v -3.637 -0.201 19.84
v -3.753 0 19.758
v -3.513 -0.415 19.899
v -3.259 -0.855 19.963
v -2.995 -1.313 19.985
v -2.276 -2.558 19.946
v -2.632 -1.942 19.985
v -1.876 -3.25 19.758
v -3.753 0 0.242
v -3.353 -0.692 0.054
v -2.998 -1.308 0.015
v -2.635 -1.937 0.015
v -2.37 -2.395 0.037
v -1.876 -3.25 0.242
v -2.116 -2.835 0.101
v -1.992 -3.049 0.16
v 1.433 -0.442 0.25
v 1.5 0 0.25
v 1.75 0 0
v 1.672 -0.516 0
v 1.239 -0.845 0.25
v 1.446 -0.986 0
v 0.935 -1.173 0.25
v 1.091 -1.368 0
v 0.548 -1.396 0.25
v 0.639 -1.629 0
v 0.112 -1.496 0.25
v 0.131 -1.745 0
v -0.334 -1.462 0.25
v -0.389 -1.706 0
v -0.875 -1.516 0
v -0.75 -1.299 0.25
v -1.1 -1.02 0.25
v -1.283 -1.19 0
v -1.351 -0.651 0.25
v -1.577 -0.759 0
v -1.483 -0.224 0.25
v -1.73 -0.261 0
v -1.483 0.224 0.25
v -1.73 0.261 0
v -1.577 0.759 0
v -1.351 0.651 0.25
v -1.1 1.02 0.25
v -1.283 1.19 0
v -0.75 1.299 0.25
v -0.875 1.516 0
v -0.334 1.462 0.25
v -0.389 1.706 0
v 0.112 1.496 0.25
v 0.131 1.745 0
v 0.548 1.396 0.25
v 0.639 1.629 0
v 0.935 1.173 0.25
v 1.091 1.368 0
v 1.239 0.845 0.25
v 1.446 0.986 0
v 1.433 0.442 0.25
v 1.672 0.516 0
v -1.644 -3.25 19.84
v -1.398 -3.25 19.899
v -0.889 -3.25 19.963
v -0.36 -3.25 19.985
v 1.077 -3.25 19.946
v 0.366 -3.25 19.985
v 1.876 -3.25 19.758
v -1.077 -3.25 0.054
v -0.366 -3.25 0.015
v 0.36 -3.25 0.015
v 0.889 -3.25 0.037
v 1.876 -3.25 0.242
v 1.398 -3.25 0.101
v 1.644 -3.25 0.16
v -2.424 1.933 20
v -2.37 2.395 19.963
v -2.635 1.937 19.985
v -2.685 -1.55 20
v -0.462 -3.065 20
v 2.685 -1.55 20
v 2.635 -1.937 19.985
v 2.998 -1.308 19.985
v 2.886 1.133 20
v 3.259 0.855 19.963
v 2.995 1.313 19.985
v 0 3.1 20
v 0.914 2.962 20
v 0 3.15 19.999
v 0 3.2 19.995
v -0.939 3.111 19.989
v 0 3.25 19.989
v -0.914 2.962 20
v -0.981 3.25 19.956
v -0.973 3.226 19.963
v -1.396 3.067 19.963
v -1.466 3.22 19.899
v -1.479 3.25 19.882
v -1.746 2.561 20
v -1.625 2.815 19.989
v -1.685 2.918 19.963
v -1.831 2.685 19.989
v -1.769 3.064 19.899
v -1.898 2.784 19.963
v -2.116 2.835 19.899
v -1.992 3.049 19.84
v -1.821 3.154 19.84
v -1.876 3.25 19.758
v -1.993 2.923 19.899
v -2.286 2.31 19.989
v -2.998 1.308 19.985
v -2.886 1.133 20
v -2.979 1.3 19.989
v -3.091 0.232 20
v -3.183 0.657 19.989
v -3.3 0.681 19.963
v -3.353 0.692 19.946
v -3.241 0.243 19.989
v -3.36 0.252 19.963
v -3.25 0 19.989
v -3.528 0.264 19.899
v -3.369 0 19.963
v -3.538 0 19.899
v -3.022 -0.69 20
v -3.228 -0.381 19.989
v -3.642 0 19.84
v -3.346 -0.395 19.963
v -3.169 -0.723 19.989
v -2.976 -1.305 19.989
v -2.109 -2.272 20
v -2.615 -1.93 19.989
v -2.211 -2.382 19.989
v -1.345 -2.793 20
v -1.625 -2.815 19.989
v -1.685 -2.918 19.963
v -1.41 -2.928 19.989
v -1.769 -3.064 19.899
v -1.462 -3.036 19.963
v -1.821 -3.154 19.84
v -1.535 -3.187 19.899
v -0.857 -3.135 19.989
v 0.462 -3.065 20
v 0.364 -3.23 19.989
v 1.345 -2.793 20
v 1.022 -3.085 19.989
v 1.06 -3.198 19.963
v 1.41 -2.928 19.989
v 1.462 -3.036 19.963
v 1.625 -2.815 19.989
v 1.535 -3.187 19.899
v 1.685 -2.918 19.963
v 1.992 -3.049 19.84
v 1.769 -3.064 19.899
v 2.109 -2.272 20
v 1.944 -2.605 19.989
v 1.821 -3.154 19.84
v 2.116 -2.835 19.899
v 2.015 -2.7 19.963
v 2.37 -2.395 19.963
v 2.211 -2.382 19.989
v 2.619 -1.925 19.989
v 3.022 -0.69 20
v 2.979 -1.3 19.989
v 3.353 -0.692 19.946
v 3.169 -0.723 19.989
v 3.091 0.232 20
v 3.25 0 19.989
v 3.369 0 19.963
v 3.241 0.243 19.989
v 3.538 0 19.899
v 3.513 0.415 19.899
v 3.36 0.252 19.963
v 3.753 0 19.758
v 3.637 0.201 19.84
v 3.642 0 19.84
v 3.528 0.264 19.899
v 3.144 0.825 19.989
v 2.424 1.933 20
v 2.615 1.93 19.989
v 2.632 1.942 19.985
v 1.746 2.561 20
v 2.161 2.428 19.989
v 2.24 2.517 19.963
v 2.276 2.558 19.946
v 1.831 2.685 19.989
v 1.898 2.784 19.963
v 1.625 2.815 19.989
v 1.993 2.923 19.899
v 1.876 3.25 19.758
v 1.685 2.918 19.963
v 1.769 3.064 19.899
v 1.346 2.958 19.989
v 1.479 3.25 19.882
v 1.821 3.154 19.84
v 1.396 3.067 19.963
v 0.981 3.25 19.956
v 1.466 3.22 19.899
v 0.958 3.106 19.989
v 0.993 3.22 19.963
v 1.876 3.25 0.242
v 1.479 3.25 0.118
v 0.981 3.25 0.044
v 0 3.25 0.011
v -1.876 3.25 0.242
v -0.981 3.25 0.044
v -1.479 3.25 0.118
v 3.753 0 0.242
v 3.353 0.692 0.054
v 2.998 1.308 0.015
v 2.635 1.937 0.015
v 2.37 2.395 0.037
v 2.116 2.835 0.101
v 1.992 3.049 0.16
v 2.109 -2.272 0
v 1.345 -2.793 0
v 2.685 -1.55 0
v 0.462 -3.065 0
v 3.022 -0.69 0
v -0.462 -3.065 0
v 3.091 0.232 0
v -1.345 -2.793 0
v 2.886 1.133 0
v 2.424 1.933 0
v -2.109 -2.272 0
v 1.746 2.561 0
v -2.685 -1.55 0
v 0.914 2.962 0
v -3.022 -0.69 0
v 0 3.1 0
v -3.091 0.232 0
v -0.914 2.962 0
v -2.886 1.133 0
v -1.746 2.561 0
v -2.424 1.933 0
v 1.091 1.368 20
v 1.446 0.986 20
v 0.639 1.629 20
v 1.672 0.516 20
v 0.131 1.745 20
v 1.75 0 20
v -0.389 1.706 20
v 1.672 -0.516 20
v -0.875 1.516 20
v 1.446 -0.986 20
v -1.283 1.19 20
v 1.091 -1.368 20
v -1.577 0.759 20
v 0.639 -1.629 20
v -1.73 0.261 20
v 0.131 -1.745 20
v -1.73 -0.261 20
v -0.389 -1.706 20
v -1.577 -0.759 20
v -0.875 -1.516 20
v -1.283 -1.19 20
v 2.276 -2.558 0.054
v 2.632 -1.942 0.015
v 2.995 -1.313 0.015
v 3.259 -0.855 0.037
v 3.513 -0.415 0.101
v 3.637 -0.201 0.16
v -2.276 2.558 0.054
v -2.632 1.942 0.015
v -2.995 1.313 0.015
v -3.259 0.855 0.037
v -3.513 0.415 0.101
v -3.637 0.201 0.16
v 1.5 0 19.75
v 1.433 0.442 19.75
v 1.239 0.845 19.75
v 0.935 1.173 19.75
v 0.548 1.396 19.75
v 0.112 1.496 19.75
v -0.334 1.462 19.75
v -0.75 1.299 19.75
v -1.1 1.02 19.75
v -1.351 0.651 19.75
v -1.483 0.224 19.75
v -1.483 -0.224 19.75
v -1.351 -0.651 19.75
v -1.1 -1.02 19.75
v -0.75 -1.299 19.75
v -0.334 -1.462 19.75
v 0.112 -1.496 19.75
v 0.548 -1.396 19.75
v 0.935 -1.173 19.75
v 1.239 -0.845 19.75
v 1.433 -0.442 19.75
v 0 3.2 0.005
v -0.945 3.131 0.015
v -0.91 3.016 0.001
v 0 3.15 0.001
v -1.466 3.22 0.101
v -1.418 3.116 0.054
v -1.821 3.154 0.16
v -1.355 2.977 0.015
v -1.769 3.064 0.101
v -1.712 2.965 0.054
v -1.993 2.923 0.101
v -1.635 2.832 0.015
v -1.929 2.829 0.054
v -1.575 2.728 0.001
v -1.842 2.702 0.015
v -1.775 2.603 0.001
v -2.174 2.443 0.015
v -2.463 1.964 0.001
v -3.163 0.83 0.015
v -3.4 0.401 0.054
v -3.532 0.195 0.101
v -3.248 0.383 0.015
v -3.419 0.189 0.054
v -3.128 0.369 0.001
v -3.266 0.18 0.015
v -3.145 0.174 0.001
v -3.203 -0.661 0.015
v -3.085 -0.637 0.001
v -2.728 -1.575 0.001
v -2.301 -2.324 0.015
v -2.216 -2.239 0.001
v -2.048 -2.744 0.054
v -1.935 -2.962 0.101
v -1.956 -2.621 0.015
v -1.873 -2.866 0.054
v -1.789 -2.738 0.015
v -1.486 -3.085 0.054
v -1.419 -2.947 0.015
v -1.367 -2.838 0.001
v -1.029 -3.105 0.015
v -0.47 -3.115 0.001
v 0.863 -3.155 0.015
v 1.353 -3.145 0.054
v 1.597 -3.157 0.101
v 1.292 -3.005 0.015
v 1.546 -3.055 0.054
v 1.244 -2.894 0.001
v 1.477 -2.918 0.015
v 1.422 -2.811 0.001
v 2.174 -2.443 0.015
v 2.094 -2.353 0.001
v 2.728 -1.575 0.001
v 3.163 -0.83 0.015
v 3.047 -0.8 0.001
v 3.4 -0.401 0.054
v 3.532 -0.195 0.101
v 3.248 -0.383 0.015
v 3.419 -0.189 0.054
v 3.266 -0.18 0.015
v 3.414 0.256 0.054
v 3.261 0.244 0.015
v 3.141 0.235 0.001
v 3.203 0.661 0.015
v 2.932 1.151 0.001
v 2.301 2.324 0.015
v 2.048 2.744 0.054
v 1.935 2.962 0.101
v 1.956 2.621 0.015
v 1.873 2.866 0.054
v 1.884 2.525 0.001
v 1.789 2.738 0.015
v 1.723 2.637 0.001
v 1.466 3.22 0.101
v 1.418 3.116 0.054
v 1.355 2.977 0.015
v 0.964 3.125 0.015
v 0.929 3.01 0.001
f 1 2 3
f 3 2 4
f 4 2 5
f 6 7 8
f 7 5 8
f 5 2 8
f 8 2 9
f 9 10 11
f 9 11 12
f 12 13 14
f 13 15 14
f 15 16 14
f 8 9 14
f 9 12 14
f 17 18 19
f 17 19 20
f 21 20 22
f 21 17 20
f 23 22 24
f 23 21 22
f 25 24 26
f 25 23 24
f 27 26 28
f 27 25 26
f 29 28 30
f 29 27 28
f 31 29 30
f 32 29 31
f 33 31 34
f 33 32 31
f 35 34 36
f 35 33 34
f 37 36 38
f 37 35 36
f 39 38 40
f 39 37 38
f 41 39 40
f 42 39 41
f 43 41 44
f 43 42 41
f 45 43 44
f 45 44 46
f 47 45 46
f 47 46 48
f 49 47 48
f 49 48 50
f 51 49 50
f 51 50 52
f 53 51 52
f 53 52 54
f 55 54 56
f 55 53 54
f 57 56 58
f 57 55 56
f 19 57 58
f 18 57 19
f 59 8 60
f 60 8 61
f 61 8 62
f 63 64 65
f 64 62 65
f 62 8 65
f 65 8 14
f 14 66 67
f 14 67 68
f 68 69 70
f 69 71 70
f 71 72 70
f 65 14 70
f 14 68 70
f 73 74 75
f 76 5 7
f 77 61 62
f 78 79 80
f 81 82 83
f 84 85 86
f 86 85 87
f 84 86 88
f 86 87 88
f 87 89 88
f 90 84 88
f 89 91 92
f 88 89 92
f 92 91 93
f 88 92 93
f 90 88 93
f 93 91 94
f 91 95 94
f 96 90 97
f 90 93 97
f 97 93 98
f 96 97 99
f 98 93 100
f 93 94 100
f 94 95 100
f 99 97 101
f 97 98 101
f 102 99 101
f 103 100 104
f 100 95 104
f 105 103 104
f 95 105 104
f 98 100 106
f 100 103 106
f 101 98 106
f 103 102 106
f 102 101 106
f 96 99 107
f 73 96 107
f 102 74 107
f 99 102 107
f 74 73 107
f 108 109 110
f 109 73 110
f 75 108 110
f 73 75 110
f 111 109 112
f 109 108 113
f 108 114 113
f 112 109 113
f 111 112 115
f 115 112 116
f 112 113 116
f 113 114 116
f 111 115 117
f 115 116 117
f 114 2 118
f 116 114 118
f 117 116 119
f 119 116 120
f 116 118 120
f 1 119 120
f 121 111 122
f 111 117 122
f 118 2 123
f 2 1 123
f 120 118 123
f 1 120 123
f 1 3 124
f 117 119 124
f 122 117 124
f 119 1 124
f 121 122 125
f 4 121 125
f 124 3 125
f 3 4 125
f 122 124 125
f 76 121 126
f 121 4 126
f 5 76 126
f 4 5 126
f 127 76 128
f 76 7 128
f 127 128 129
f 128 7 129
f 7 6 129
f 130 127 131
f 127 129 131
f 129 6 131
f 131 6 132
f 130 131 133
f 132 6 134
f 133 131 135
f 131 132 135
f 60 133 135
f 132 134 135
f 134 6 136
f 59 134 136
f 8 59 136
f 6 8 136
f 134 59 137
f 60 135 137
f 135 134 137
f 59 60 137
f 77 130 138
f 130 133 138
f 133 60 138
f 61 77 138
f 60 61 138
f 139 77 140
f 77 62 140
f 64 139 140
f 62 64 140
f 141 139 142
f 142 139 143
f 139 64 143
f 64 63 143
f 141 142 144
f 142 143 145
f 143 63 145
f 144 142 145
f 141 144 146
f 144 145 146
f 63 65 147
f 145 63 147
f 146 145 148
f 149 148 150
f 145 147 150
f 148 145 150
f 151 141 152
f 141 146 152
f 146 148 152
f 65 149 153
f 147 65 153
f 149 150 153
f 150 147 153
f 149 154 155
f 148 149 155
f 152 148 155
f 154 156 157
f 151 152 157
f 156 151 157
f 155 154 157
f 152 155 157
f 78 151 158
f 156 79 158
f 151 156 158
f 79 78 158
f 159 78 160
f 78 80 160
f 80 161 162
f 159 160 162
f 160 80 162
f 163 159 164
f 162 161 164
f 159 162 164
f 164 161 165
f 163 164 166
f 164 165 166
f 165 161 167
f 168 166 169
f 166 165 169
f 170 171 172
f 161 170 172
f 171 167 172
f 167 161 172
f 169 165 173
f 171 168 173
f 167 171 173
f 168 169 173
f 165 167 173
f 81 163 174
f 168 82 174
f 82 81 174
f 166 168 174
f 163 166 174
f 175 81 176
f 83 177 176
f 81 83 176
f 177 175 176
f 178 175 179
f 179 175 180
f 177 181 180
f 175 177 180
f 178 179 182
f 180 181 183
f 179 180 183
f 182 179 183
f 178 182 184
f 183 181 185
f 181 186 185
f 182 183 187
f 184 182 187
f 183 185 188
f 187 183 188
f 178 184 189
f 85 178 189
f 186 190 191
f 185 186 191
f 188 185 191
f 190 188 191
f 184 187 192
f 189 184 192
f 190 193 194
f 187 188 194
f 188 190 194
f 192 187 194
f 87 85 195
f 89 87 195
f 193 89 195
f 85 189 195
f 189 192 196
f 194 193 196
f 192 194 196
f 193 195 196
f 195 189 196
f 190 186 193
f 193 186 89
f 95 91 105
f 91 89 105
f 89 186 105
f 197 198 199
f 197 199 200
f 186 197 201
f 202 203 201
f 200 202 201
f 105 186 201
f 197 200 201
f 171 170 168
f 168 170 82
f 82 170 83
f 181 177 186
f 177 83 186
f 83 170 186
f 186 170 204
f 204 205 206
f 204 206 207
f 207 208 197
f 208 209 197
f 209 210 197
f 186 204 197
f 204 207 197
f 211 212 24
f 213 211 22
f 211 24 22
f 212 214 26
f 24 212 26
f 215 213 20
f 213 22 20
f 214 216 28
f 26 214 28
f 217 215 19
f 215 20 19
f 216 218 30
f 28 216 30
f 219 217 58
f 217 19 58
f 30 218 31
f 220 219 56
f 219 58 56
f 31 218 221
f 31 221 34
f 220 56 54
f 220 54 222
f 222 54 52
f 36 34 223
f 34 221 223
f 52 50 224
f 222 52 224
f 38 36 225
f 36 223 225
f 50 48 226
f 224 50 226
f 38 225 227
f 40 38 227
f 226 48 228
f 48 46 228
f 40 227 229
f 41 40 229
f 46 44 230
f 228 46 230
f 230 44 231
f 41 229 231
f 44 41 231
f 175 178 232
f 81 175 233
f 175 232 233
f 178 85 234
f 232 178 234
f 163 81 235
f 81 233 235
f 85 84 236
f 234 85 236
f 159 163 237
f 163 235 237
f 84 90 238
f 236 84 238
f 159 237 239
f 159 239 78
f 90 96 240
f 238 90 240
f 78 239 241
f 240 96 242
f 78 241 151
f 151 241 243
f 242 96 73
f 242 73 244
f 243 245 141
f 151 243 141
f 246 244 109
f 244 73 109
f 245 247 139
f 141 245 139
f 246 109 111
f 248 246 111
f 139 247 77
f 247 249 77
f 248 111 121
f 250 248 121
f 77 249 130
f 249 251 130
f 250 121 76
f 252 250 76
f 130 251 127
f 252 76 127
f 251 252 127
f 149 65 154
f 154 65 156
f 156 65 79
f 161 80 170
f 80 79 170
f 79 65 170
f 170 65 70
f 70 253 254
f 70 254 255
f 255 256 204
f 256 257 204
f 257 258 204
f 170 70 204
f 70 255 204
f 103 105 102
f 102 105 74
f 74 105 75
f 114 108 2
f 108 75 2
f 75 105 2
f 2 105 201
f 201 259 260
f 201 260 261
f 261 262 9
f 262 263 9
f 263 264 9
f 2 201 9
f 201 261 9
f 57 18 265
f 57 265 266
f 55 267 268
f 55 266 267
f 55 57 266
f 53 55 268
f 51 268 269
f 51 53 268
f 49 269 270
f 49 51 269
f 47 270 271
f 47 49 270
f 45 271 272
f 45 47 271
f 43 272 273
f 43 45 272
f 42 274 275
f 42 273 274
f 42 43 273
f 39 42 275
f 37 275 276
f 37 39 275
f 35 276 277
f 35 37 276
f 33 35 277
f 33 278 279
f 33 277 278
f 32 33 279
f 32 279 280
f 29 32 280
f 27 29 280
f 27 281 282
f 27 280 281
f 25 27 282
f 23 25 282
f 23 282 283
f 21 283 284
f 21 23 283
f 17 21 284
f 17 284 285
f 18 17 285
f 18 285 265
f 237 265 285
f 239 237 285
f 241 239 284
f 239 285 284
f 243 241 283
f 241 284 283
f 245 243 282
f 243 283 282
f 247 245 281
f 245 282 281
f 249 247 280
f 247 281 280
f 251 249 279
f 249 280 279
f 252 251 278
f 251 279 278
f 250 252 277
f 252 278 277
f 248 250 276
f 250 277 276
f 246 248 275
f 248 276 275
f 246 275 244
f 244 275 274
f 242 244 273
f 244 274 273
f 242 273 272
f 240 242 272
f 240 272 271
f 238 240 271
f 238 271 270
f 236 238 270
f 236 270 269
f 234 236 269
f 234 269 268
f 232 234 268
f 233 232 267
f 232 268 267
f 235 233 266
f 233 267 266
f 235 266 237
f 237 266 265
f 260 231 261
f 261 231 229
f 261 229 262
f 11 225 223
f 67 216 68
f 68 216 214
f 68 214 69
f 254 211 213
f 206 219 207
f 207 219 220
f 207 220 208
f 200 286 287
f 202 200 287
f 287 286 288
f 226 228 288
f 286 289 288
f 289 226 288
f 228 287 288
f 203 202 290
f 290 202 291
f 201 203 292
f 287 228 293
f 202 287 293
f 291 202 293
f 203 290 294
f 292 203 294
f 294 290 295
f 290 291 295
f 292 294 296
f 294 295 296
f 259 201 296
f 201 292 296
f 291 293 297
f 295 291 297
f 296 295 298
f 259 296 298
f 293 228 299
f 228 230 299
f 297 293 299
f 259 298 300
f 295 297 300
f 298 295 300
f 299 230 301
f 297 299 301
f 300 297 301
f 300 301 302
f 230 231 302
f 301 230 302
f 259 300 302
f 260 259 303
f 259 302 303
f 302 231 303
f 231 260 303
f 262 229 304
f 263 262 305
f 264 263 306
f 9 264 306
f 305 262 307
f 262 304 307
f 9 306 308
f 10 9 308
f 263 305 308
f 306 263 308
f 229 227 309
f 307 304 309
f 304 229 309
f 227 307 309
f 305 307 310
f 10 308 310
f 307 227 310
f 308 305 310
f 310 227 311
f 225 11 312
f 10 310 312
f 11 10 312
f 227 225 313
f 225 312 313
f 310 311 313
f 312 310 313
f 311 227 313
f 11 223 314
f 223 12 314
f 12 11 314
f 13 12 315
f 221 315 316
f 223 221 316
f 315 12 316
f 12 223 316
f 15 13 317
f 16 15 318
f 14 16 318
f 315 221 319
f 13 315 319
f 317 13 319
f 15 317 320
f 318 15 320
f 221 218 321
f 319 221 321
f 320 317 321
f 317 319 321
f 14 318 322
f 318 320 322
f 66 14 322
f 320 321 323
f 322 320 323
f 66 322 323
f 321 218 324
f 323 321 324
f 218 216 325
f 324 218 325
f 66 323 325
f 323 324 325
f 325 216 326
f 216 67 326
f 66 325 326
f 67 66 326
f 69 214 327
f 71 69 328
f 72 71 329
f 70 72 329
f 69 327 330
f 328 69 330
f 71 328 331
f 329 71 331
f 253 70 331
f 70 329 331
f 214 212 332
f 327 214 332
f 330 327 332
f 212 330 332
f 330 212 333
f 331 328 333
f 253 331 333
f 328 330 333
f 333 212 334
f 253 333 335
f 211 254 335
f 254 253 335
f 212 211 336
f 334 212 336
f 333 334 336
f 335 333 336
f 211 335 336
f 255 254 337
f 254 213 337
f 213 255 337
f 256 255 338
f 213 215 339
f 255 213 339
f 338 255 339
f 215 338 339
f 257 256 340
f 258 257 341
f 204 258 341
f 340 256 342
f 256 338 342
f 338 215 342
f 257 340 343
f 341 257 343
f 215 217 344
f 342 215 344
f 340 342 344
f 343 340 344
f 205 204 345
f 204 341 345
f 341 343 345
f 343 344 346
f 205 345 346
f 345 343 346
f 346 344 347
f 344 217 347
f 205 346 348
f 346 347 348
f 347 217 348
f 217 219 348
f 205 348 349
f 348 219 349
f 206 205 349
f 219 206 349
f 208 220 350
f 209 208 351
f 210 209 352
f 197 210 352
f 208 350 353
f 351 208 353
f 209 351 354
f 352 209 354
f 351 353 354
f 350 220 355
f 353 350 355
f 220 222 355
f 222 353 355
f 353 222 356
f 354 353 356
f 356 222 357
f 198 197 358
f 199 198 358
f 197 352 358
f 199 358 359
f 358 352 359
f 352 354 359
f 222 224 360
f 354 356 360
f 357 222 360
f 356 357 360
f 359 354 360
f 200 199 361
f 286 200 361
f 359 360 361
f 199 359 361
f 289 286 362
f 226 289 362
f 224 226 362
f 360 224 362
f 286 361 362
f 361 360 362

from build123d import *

# Parameters (mm, degrees)
BOSS_EXTRUDE2_DEPTH     = 20
CUT_EXTRUDE5_DEPTH      = 21.606936666
CUT_EXTRUDE5_DEPTH_BACK = 21.606936666
SKETCH2_R               = 1.5
CHAMFER1_SIZE           = 0.25


with BuildPart() as part:
    # Sketch3 → Boss-Extrude2 (new body)
    with BuildSketch(Plane.XY):
        Polygon((3.75277675, 0), (1.876388375, 3.25), (-1.876388375, 3.25), (-3.75277675, 0), (-1.876388375, -3.25), (1.876388375, -3.25), align=None)
    extrude(amount=BOSS_EXTRUDE2_DEPTH)

    # Sketch5 → Cut-Revolve1 (revolve, cut)
    with BuildSketch(Plane(origin=(0, 0, 0), x_dir=(0, 0, -1), z_dir=(1, 0, 0))):
        with BuildLine():
            Line((-20, 0), (-20, 3.1))
            ThreePointArc((-20, 3.1), (-19.707106781, 3.807106781), (-19, 4.1))
            Line((-19, 4.1), (-1, 4.1))
            ThreePointArc((-1, 4.1), (-0.292893219, 3.807106781), (0, 3.1))
            Line((0, 3.1), (0, 1.684209227))
            Line((0, 1.684209227), (1.086869428, 1.684209227))
            Line((1.086869428, 1.684209227), (1.086869428, 4.997067517))
            Line((1.086869428, 4.997067517), (-20.5, 4.997067517))
            Line((-20.5, 4.997067517), (-20.5, 0))
            Line((-20.5, 0), (-20, 0))
        make_face()
    revolve(axis=Axis((0, 0, 20), (0, 0, 1)), mode=Mode.SUBTRACT)

    # Sketch2 → Cut-Extrude5 (cut, two sides: drawn at the far end of the back side and taken through both)
    with BuildSketch(Plane.XY.offset(-CUT_EXTRUDE5_DEPTH_BACK)):
        Circle(SKETCH2_R)
    extrude(amount=CUT_EXTRUDE5_DEPTH + CUT_EXTRUDE5_DEPTH_BACK, mode=Mode.SUBTRACT)

    # Chamfer1
    chamfer1_edges = [part.edges().sort_by_distance(p)[0] for p in [
        (-1.5, 0, 0),
        (-1.5, 0, 20),
    ]]
    chamfer(chamfer1_edges, length=CHAMFER1_SIZE)


solid = part.part
